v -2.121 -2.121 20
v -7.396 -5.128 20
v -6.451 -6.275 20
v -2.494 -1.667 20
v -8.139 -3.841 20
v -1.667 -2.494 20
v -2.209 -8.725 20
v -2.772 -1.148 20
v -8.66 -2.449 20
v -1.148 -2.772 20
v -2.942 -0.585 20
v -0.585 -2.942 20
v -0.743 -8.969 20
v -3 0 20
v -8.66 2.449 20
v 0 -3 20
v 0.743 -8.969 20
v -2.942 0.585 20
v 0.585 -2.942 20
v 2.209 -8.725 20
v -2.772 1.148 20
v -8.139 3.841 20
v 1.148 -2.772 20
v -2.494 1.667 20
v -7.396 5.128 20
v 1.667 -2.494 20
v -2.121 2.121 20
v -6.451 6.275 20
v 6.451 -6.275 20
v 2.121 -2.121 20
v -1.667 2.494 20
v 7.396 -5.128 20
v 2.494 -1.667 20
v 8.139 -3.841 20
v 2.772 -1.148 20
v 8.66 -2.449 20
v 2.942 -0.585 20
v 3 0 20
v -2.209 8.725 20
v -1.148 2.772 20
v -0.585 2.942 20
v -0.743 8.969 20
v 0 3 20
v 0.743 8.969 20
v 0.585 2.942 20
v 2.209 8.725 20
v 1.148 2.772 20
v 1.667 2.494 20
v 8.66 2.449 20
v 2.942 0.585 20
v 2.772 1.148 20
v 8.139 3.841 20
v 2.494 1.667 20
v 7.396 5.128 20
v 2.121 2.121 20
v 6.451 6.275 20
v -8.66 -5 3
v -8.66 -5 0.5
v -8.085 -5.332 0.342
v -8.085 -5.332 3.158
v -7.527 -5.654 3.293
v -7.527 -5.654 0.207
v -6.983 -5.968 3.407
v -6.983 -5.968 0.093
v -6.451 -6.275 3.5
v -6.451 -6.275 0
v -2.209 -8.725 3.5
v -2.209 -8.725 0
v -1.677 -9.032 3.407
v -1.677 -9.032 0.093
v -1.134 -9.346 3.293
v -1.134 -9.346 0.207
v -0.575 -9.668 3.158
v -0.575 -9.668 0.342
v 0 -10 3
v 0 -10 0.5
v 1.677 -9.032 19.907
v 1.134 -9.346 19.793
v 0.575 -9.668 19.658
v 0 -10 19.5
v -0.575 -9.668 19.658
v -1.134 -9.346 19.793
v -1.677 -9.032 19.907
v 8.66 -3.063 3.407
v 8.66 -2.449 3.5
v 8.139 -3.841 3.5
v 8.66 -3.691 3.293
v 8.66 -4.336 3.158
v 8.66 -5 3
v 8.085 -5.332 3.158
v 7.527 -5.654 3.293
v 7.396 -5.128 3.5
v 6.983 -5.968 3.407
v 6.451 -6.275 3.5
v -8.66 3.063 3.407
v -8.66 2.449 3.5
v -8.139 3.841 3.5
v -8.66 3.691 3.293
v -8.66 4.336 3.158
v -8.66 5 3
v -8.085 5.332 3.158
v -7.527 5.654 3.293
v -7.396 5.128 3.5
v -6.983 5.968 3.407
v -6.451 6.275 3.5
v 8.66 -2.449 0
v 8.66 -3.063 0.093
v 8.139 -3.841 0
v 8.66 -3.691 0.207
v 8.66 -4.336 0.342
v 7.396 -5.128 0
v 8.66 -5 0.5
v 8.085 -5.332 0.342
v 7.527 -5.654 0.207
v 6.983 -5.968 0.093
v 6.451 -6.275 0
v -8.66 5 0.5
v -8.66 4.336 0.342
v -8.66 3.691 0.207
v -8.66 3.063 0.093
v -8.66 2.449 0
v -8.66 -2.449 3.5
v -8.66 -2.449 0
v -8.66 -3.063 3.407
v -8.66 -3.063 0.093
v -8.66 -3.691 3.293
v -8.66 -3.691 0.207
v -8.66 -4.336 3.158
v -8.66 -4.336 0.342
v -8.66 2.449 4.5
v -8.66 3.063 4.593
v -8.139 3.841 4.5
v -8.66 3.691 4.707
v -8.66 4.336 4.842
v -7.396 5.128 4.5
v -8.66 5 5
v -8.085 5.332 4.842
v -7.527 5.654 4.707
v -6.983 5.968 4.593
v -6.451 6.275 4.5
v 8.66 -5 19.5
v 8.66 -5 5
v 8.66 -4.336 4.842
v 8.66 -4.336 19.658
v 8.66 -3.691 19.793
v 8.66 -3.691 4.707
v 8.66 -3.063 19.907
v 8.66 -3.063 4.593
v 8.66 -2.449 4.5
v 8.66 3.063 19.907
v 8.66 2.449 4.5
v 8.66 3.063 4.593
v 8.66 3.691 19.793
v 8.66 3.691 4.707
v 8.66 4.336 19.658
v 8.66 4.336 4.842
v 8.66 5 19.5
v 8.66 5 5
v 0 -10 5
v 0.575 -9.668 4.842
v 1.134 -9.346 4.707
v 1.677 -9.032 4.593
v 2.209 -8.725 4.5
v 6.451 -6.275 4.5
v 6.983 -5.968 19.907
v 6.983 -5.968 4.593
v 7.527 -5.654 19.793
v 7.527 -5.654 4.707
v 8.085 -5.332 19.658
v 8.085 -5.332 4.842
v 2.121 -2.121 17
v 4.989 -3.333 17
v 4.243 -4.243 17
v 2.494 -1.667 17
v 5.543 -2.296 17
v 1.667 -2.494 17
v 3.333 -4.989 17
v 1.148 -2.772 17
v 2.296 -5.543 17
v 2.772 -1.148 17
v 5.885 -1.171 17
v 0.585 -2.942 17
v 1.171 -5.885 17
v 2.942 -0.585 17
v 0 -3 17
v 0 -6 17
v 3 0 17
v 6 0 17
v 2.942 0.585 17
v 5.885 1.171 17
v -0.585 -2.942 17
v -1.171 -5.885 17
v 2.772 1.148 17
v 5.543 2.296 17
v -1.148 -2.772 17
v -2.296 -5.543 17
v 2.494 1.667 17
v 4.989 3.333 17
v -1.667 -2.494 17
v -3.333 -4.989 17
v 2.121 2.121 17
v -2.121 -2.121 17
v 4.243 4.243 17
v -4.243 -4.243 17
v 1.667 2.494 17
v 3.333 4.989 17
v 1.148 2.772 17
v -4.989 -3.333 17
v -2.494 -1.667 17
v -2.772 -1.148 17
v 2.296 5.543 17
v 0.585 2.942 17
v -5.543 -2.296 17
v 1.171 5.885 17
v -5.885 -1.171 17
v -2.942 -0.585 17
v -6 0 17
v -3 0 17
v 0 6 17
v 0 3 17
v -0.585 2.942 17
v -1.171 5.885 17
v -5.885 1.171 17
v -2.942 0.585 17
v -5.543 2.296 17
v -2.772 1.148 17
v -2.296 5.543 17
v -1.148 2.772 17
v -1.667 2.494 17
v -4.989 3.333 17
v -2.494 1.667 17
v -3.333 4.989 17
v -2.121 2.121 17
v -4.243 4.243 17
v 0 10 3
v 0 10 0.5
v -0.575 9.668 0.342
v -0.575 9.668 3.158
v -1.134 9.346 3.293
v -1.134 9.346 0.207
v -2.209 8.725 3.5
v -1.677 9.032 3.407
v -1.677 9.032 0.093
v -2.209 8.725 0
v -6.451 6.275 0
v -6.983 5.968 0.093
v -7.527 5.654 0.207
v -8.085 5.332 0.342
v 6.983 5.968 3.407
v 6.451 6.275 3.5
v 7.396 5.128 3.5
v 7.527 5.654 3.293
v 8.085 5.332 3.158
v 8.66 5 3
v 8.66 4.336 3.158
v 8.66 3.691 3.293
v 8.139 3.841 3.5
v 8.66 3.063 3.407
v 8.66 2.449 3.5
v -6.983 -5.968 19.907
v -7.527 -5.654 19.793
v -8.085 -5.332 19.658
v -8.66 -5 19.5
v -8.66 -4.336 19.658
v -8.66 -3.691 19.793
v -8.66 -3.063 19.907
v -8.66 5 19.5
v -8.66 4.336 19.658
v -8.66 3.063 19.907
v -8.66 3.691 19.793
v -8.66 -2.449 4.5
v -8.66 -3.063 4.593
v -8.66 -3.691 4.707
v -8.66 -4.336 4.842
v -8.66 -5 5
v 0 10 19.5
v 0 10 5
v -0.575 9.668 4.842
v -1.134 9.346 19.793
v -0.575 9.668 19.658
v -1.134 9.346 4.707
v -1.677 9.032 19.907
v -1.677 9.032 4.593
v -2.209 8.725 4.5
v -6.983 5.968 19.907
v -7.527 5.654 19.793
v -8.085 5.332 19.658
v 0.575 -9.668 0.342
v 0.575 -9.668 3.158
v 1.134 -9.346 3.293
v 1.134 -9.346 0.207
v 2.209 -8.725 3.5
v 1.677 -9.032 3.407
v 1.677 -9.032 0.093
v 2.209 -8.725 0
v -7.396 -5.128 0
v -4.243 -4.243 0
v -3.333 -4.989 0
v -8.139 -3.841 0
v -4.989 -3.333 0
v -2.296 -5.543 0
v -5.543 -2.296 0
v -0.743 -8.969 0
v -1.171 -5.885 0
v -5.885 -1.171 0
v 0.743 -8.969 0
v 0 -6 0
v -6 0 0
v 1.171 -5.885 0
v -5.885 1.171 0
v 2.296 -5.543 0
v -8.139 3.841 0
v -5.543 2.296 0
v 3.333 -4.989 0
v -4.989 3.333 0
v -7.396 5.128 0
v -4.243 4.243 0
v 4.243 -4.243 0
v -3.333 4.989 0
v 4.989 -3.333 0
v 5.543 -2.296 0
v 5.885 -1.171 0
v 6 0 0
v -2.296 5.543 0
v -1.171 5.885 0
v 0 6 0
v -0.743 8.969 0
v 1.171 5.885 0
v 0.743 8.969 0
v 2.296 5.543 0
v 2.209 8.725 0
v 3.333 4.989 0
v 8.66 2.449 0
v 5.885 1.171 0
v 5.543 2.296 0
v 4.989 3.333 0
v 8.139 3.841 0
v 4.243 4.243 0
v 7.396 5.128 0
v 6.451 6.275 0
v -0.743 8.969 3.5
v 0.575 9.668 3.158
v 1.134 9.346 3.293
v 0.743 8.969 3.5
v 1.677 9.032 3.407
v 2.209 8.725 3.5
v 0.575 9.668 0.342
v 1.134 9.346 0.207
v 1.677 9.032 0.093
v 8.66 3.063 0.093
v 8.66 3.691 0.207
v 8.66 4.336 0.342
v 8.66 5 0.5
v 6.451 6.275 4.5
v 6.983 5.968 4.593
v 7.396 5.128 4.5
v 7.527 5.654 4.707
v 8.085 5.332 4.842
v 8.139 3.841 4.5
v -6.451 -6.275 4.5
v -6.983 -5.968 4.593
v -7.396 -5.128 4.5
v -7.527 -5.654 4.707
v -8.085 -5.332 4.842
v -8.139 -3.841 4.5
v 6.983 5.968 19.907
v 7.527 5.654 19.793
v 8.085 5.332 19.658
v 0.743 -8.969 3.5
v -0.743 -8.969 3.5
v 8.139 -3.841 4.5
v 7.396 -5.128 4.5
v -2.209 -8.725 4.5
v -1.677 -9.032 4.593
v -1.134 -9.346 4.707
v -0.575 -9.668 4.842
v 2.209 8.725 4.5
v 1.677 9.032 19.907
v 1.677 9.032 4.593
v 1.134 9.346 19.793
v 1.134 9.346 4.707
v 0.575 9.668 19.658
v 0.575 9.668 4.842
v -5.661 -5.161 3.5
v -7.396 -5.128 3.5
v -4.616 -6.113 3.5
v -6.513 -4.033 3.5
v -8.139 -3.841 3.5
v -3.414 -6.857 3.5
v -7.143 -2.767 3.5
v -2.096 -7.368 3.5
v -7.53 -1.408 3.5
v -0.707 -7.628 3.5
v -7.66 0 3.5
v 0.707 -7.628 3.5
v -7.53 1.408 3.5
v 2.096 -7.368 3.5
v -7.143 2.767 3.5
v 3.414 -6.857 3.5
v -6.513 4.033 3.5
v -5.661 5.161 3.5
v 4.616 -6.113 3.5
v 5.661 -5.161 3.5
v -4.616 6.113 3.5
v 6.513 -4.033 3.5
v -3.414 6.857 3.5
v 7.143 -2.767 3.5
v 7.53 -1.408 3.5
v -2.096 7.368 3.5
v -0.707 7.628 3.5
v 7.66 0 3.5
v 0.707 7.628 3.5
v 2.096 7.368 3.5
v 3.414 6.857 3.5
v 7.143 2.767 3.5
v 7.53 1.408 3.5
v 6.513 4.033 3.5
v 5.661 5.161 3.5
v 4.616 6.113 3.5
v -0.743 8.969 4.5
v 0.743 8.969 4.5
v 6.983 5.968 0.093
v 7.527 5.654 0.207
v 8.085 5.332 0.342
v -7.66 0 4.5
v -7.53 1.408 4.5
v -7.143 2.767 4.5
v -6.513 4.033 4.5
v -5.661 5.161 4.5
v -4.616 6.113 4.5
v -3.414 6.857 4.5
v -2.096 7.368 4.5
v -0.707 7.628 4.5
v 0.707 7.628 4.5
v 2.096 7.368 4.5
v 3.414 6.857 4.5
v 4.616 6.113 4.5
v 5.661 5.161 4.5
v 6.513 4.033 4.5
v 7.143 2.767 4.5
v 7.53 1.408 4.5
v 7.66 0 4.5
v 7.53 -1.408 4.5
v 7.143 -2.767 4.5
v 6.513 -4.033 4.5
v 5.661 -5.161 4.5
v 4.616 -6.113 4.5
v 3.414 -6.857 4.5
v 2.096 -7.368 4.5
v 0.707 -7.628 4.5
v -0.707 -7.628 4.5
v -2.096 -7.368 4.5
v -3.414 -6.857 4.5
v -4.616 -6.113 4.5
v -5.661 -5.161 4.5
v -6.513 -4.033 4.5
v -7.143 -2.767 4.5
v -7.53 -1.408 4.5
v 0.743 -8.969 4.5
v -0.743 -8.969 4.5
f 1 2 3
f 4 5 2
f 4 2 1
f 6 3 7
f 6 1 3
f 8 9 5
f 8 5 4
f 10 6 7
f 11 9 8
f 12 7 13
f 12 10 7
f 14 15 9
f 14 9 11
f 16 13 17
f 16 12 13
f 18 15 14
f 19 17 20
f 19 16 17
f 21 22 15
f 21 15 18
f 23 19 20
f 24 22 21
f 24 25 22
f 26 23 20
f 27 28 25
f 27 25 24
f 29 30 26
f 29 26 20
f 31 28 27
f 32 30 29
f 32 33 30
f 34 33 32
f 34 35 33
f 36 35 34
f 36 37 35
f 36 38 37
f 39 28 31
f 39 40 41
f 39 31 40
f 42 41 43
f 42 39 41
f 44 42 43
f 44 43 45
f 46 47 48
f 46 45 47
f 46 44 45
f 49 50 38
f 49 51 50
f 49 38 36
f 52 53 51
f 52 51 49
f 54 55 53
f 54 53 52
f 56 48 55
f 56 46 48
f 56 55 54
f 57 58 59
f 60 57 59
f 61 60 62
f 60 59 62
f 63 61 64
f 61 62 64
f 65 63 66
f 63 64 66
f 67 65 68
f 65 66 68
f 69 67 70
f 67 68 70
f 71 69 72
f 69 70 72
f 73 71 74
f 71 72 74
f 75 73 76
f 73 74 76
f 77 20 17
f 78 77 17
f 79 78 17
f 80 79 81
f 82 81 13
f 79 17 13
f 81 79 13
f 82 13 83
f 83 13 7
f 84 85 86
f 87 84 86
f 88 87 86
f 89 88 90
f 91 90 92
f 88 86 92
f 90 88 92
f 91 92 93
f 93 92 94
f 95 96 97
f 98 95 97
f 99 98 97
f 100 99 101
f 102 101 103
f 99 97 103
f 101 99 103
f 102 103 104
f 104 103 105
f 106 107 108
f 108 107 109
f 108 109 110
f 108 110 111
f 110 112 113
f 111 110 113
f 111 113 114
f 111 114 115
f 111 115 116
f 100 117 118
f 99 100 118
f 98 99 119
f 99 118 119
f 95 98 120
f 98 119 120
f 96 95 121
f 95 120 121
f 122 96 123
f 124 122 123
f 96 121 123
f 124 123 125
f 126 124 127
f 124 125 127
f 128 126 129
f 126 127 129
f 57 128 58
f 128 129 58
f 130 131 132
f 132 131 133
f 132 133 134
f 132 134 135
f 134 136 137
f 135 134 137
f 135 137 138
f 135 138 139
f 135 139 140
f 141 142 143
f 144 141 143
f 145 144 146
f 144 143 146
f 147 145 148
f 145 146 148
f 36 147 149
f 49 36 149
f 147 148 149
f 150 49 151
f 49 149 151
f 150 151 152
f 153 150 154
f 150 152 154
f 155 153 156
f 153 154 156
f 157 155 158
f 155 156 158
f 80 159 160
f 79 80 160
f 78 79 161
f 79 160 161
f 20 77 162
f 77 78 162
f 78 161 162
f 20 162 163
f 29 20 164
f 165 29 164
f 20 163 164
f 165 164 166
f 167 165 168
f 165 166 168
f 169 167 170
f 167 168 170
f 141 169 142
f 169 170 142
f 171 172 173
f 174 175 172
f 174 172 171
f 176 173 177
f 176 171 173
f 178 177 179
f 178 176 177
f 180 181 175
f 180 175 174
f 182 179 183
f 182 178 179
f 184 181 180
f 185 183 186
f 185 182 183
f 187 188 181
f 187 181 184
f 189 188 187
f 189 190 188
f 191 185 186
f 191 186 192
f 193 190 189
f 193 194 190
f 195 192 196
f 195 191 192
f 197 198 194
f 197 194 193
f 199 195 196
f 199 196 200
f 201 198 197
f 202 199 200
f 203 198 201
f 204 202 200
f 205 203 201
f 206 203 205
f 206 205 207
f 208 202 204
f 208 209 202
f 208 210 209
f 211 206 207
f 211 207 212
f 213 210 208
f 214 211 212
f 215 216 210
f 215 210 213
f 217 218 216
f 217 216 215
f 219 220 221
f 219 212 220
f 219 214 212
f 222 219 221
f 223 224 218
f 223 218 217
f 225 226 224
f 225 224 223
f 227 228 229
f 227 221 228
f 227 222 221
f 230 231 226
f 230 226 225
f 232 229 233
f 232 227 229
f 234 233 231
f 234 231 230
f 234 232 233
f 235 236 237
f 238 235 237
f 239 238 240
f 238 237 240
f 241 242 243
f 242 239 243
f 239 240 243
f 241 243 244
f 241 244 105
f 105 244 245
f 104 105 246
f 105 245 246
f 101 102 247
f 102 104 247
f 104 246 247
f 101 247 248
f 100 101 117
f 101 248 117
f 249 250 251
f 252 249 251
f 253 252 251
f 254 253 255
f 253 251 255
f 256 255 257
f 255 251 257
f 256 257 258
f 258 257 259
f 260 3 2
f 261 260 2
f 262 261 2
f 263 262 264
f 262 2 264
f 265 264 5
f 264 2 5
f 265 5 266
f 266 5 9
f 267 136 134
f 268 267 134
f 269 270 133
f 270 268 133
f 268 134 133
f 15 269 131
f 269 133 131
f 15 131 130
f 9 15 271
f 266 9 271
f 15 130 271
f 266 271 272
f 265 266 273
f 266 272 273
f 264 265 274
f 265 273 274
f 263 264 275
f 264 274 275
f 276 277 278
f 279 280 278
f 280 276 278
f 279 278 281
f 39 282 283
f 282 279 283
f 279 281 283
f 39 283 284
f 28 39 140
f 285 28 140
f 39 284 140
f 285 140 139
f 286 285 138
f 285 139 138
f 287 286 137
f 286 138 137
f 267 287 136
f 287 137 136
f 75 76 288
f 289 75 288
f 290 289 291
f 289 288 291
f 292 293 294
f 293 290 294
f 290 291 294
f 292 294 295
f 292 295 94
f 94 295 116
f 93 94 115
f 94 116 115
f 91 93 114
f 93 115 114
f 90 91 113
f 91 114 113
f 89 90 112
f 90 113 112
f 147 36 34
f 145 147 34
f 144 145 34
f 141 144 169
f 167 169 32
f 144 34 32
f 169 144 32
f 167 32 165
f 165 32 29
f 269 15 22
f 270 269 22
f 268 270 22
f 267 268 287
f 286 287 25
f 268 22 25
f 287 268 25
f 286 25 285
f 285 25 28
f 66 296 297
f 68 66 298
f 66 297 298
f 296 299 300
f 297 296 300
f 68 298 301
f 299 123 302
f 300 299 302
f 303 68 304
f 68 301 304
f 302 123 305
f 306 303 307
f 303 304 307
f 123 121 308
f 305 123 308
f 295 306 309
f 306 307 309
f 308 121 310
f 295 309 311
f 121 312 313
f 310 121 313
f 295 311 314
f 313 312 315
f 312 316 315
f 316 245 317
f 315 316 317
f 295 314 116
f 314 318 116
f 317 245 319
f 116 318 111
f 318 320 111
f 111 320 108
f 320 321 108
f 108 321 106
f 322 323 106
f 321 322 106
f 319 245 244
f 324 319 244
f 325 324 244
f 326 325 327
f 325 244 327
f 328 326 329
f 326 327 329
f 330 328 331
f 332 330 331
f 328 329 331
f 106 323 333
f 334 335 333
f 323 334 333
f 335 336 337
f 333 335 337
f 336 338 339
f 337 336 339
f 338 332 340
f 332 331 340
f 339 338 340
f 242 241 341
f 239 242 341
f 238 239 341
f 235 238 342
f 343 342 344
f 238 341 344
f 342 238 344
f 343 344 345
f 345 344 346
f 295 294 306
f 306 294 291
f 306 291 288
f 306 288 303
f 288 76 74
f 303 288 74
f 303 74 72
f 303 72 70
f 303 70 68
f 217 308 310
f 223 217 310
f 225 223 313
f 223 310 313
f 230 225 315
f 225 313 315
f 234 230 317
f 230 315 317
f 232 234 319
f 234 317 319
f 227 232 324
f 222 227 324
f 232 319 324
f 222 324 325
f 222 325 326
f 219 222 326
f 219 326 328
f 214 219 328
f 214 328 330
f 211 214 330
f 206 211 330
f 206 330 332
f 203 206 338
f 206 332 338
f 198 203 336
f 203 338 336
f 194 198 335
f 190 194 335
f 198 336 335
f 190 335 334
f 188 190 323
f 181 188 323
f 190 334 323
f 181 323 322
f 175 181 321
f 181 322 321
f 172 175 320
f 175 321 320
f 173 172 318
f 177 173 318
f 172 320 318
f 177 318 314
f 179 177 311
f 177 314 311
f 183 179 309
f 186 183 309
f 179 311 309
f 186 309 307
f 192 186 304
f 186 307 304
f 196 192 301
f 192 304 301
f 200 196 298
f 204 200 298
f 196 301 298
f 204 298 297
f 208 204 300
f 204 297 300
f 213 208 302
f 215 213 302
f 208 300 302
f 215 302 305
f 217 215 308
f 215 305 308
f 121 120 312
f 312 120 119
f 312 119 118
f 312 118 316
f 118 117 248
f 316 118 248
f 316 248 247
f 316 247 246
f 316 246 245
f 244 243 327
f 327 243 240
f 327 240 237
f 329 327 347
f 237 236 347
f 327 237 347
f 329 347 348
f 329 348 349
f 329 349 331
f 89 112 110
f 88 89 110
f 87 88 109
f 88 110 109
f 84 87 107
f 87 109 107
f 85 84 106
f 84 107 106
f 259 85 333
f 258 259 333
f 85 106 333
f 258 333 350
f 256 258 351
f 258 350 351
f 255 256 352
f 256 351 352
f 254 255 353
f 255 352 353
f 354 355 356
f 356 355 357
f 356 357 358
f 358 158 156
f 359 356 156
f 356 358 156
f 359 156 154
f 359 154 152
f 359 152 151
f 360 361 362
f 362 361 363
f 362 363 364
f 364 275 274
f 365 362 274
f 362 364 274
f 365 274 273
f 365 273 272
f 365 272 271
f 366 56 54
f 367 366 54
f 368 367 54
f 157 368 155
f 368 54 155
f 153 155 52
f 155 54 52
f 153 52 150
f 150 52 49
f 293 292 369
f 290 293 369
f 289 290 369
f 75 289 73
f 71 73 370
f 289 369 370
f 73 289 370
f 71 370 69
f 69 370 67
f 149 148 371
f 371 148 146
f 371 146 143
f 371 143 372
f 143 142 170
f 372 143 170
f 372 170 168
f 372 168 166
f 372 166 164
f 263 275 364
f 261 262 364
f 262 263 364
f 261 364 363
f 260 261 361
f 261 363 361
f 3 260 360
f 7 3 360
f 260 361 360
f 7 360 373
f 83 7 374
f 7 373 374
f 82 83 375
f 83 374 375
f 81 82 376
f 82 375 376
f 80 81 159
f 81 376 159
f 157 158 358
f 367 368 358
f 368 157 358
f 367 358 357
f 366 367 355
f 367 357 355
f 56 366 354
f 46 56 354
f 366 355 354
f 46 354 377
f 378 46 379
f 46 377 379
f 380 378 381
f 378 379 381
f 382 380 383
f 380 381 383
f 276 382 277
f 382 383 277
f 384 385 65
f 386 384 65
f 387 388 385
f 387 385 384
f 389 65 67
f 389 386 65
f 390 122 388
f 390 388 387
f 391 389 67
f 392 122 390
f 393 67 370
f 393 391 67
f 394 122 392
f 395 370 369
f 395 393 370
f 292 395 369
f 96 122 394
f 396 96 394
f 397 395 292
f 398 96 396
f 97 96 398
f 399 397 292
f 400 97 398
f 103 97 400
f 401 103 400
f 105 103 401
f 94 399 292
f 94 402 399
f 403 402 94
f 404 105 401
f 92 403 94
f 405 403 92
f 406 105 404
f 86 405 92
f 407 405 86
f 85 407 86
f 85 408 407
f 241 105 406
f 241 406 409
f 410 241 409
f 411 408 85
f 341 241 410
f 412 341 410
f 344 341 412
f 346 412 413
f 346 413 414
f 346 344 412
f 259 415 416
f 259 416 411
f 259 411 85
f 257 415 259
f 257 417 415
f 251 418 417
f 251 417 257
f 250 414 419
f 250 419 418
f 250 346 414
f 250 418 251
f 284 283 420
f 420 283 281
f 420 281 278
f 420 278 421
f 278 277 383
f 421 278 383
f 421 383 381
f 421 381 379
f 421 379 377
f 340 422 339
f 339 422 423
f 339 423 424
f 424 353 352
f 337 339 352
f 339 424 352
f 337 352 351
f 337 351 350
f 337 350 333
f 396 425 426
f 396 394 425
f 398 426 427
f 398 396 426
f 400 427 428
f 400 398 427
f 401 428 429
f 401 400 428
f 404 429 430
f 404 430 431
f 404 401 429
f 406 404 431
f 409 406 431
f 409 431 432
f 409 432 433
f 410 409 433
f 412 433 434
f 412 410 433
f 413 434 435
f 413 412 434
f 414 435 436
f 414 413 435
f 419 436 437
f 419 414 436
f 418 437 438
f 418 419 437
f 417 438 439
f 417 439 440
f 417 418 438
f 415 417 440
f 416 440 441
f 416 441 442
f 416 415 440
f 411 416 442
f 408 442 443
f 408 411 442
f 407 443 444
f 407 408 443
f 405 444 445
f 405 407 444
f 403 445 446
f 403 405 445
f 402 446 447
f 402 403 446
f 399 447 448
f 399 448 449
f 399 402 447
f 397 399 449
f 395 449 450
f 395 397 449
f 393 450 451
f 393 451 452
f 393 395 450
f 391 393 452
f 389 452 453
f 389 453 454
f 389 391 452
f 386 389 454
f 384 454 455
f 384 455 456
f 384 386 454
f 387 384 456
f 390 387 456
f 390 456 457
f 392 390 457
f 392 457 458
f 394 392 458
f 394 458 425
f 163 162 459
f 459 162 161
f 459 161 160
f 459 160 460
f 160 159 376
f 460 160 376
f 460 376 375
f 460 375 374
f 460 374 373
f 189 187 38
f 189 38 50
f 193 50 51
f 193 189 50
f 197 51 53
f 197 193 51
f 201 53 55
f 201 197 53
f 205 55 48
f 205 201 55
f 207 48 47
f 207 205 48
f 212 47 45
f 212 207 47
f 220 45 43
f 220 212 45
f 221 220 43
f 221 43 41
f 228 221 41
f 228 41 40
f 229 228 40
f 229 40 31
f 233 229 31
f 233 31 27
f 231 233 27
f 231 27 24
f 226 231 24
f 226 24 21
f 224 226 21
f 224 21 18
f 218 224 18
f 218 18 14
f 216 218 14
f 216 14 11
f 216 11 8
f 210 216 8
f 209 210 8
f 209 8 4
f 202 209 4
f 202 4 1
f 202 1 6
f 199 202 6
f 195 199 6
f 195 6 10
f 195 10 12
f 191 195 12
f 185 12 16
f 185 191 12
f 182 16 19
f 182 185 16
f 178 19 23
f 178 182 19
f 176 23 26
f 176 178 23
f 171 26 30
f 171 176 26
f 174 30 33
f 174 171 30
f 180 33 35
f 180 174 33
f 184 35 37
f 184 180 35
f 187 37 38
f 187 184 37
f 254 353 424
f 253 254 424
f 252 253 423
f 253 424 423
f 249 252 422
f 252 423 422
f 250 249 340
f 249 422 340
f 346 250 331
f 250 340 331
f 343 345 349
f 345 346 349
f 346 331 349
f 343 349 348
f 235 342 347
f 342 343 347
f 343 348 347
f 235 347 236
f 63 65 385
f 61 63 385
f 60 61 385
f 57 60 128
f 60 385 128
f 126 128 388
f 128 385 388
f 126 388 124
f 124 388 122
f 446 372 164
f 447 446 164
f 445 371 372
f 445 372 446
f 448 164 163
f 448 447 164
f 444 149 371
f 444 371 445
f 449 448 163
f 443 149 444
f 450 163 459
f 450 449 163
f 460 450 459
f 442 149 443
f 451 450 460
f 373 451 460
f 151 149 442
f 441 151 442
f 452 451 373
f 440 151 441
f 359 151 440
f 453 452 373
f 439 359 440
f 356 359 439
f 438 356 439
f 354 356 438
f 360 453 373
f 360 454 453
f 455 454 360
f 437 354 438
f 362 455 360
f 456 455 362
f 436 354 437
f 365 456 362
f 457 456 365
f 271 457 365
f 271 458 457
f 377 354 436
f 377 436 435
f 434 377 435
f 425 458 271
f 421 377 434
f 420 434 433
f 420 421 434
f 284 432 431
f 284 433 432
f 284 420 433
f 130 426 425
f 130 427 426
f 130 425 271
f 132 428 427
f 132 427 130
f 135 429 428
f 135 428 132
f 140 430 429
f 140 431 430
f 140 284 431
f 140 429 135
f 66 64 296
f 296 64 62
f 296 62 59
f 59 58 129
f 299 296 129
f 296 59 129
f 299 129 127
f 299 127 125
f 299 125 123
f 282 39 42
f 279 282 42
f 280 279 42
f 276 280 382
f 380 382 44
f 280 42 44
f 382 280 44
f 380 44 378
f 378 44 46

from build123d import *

# Parameters (mm, degrees)
ESBO_O2_R                = 3
RESSALTO_EXTRUS_O1_DEPTH = 20
ESBO_O3_R                = 6
CORTE_EXTRUS_O1_DEPTH    = 17


with BuildPart() as part:
    # Esboço2 → Ressalto-extrusão1 (new body)
    with BuildSketch(Plane.XY):
        Polygon((-8.660254038, 5), (-8.660254038, -5), (0, -10), (8.660254038, -5), (8.660254038, 5), (0, 10), align=None)
        Circle(ESBO_O2_R, mode=Mode.SUBTRACT)
    extrude(amount=RESSALTO_EXTRUS_O1_DEPTH)

    # Esboço3 → Corte-extrusão1 (cut)
    with BuildSketch(Plane(origin=(0, 0, 0), x_dir=(-1, 0, 0), z_dir=(0, 0, -1))):
        Circle(ESBO_O3_R)
    extrude(amount=-CORTE_EXTRUS_O1_DEPTH, mode=Mode.SUBTRACT)

    # Esboço6 → Corte-Revolução3 (revolve, cut)
    with BuildSketch(Plane(origin=(0, 0, 0), x_dir=(1, 0, 0), z_dir=(0, 1, 0))):
        Polygon((-8.660254038, -3.5), (-10.094489548, -3.5), (-10.094489548, -4.5), (-8.660254038, -4.5), (-7.660254038, -4.5), (-7.660254038, -3.5), align=None)
    revolve(axis=Axis((0, 0, 21), (0, 0, -1)), mode=Mode.SUBTRACT)

    # Esboço11 → Corte-Revolução7 (revolve, cut)
    with BuildSketch(Plane(origin=(0, 0, 0), x_dir=(0, 0, -1), z_dir=(1, 0, 0))):
        Polygon((0, 9), (-0.5, 10), (-3, 10), (-3.5, 9), (-4.5, 9), (-5, 10), (-19.5, 10), (-20, 9), (-20, 10.45616239), (0, 10.45616239), align=None)
    revolve(axis=Axis((0, 0, 21), (0, 0, -1)), mode=Mode.SUBTRACT)


solid = part.part
